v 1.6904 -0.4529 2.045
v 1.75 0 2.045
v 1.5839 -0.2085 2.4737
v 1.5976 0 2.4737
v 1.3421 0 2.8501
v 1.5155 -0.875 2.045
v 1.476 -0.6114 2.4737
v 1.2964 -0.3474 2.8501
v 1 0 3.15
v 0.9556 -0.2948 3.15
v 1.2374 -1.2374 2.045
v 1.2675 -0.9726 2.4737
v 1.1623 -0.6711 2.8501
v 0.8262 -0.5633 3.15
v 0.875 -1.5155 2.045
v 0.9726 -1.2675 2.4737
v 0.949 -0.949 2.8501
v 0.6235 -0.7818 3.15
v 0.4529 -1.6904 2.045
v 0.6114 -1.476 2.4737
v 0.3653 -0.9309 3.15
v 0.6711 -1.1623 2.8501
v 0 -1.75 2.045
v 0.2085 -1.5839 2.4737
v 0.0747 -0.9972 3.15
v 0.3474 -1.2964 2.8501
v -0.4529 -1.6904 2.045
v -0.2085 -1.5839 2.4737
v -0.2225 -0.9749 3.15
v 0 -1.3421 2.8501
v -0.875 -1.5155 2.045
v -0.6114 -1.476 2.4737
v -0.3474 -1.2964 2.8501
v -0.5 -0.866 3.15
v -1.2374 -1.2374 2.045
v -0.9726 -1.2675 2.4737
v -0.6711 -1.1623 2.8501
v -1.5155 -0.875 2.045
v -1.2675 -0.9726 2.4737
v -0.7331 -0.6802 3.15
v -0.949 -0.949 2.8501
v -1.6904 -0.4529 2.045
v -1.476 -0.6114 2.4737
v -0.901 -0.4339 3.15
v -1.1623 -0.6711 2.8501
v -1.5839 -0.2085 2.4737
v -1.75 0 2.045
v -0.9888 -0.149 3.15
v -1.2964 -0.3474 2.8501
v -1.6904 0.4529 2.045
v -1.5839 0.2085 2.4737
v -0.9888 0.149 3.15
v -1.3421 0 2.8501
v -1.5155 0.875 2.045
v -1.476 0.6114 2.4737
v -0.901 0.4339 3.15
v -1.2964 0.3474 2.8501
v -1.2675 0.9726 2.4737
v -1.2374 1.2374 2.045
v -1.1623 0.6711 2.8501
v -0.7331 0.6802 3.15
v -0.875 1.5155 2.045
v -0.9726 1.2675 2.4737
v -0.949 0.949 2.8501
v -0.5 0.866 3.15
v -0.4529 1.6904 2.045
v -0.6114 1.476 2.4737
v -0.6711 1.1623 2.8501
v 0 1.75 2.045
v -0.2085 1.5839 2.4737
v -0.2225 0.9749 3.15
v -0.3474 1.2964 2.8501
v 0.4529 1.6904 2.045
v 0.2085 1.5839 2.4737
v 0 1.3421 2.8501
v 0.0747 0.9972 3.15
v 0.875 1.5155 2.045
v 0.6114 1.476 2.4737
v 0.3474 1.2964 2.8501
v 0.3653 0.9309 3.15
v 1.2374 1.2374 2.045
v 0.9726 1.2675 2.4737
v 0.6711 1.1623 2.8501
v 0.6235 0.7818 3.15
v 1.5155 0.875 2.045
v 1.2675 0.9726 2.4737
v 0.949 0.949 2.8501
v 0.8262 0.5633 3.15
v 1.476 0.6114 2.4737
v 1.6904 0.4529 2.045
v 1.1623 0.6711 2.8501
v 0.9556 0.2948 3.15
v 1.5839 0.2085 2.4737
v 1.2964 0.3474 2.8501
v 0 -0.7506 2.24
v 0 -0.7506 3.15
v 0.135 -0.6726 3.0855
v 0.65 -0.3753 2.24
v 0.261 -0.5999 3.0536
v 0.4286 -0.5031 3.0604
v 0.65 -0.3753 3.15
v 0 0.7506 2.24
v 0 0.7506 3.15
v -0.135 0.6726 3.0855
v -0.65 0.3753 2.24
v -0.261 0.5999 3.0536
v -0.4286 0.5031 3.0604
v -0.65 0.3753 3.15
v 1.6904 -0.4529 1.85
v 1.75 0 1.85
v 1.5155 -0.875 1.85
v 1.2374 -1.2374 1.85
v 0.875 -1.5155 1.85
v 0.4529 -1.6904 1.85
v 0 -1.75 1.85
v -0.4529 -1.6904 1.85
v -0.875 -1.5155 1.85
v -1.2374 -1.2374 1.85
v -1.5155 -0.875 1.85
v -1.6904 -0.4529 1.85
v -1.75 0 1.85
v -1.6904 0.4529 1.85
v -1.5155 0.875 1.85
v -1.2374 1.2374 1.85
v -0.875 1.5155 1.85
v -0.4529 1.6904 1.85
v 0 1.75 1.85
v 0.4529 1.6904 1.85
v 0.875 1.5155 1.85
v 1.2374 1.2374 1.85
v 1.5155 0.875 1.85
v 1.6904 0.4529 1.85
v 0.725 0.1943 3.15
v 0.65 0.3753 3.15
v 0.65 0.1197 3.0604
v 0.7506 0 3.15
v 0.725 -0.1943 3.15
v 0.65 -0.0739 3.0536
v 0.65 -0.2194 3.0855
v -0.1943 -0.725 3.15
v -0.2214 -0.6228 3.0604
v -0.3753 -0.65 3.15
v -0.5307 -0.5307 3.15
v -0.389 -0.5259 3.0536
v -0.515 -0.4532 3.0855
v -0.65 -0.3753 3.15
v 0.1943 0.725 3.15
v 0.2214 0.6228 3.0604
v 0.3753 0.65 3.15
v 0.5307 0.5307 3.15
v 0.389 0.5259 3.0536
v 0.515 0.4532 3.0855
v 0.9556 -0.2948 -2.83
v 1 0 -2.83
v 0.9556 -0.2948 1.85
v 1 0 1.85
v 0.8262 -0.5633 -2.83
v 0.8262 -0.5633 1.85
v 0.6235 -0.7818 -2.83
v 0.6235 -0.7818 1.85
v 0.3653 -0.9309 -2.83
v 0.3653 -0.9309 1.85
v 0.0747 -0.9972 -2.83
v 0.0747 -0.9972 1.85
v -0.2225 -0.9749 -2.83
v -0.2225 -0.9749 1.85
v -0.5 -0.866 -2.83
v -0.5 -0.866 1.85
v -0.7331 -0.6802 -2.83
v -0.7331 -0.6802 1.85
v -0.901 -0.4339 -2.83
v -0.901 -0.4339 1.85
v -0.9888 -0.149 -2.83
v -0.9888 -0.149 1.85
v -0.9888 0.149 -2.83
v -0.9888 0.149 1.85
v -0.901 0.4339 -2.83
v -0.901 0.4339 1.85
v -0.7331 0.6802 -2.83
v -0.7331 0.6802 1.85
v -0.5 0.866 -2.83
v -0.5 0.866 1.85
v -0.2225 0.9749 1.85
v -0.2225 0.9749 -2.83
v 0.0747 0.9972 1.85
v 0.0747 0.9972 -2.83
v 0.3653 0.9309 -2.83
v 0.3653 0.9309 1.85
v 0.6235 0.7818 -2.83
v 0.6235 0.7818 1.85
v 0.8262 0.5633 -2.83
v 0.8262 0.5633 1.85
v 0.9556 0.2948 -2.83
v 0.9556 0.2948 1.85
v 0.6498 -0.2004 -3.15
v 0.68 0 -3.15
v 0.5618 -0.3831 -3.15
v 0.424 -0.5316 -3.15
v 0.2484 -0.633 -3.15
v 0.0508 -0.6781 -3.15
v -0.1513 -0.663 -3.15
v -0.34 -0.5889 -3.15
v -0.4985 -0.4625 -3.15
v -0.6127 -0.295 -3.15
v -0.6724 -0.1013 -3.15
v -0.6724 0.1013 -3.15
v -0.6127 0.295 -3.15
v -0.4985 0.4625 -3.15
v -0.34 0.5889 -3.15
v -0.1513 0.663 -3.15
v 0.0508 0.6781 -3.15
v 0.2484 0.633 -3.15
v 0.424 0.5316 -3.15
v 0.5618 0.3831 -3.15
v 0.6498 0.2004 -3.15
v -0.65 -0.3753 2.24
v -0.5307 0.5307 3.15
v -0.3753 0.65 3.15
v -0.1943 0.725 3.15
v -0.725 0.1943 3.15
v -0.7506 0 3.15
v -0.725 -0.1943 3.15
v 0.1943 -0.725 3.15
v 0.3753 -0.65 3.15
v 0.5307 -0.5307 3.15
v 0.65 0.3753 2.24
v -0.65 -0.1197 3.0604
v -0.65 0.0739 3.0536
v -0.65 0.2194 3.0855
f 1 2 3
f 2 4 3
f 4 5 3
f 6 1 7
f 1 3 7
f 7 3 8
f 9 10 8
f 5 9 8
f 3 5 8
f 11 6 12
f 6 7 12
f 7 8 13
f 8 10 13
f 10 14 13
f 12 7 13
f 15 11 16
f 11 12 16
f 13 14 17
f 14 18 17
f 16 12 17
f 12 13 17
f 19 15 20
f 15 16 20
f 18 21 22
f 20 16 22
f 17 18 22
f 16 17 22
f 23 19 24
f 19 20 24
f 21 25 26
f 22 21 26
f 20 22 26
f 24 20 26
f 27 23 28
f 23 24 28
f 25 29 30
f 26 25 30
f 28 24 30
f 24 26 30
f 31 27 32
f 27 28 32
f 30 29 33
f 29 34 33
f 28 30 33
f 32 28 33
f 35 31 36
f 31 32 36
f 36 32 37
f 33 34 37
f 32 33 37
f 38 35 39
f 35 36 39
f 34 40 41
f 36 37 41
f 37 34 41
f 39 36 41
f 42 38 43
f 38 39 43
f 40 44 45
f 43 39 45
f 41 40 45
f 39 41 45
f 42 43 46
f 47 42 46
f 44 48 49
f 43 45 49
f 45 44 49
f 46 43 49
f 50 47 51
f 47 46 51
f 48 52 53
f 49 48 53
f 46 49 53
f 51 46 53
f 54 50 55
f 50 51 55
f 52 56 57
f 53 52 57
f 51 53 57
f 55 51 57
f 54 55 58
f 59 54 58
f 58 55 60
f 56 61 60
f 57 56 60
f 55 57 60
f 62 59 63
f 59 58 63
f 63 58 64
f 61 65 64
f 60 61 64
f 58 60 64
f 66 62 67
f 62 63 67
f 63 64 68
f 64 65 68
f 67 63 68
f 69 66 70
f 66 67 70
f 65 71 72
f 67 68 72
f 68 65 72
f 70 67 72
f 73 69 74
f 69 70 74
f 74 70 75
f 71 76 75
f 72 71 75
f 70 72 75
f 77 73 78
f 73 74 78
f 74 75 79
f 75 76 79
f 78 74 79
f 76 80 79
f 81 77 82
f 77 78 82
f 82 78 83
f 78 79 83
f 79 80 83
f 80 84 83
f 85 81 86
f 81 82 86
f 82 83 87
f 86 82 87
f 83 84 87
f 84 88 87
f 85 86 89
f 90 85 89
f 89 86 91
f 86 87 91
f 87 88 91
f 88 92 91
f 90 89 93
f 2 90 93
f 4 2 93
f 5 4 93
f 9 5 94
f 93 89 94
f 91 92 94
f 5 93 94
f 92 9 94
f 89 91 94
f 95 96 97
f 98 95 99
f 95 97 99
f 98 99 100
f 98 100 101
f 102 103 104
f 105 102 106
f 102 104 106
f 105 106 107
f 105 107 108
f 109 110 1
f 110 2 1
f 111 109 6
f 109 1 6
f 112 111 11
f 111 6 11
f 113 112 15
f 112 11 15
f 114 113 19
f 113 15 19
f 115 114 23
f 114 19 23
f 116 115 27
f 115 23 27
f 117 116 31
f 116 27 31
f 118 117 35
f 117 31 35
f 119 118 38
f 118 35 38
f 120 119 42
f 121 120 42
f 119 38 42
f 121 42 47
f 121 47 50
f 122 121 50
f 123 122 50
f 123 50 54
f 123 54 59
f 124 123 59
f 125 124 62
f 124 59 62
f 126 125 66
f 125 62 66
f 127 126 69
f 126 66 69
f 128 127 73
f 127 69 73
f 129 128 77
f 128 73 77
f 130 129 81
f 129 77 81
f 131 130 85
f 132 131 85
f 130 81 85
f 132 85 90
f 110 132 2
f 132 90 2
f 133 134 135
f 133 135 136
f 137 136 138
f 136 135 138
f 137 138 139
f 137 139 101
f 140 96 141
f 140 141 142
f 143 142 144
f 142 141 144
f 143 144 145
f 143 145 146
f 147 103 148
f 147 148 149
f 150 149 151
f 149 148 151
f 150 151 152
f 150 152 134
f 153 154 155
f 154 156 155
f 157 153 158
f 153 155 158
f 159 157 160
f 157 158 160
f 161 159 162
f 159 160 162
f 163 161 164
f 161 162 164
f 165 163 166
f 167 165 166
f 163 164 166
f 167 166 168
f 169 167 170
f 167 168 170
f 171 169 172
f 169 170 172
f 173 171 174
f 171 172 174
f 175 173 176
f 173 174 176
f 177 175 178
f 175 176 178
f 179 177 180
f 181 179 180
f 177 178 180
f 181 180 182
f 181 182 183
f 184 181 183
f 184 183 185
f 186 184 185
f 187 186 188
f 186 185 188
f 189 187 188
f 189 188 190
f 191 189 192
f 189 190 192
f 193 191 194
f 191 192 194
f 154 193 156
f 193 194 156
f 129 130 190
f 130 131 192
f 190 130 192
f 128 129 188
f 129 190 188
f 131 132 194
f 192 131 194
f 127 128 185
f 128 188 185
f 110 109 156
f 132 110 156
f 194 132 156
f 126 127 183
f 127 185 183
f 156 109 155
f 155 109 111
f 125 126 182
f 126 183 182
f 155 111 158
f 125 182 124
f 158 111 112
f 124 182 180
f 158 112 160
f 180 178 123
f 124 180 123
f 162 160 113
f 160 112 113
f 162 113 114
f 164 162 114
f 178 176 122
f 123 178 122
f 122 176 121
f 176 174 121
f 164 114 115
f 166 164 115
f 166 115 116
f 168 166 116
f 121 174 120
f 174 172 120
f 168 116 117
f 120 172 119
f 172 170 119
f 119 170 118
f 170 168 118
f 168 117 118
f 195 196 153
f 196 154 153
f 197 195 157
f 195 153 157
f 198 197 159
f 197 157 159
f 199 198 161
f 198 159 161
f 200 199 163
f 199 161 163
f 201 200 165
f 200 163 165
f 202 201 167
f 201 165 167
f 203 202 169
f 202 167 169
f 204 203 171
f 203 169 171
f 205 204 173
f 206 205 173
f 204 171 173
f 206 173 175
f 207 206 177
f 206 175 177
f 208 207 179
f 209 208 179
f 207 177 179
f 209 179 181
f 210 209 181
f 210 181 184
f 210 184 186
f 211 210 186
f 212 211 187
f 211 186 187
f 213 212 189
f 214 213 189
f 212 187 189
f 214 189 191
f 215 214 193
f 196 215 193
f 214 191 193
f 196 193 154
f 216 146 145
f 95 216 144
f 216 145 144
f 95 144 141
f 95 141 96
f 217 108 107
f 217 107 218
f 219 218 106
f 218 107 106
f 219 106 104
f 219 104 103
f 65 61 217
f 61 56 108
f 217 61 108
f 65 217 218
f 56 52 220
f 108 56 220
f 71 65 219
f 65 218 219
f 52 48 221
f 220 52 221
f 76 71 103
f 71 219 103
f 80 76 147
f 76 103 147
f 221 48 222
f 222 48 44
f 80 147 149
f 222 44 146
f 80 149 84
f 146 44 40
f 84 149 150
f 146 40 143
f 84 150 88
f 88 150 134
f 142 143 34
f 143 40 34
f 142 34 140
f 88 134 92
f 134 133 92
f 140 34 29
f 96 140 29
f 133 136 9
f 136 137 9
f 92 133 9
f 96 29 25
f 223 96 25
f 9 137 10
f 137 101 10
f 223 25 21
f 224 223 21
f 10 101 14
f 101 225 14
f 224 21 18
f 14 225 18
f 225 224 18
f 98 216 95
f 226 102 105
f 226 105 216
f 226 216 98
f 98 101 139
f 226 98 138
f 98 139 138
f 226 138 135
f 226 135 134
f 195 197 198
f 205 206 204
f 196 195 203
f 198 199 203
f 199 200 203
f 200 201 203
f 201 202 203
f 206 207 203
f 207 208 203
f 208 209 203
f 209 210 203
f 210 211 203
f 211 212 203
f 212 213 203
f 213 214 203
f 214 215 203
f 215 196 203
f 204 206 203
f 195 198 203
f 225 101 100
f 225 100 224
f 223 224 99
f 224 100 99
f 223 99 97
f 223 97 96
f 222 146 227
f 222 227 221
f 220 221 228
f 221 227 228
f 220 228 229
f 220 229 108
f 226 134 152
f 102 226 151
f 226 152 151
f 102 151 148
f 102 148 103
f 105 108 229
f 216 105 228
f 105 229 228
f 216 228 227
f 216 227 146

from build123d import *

# Parameters (mm, degrees)
CUT_EXTRUDE1_DEPTH = 0.91


with BuildPart() as part:
    # Sketch2 → Revolve1 (revolve)
    with BuildSketch(Plane(origin=(0, 0, 0), x_dir=(0, 0, -1), z_dir=(1, 0, 0)), mode=Mode.PRIVATE) as revolve1_sk:
        with BuildLine():
            Line((-3.15, 0), (3.15, 0))
            Line((3.15, 0), (3.15, 0.68))
            Line((3.15, 0.68), (2.83, 1))
            Line((2.83, 1), (-1.85, 1))
            Line((-1.85, 1), (-1.85, 1.75))
            Line((-1.85, 1.75), (-2.045, 1.75))
            ThreePointArc((-2.045, 1.75), (-2.670023043, 1.481850617), (-3.15, 1))
            Line((-3.15, 1), (-3.15, 0))
        make_face()
    revolve(revolve1_sk.sketch.rotate(Axis((0, 0, 3.15), (0, 0, -1)), 90), axis=Axis((0, 0, 3.15), (0, 0, -1)))

    # Sketch3 → Cut-Extrude1 (cut)
    with BuildSketch(Plane.XY.offset(3.15)):
        Polygon((0, 0.75055535), (-0.65, 0.375277675), (-0.65, -0.375277675), (0, -0.75055535), (0.65, -0.375277675), (0.65, 0.375277675), align=None)
    extrude(amount=-CUT_EXTRUDE1_DEPTH, mode=Mode.SUBTRACT)

    # Cut-Extrude2 cone 1 section (through the dimple's axis) → Cut-Extrude2 (revolve, cut)
    with BuildSketch(Plane(origin=(0, 0, 3.15), x_dir=(0, -1, 0), z_dir=(1, 0, 0))):
        Polygon((0, 0), (0.75055535, 0), (0, 0.75055535), align=None)
    revolve(axis=Axis((0, 0, 3.15), (0, 0, -1)), mode=Mode.SUBTRACT)


solid = part.part
